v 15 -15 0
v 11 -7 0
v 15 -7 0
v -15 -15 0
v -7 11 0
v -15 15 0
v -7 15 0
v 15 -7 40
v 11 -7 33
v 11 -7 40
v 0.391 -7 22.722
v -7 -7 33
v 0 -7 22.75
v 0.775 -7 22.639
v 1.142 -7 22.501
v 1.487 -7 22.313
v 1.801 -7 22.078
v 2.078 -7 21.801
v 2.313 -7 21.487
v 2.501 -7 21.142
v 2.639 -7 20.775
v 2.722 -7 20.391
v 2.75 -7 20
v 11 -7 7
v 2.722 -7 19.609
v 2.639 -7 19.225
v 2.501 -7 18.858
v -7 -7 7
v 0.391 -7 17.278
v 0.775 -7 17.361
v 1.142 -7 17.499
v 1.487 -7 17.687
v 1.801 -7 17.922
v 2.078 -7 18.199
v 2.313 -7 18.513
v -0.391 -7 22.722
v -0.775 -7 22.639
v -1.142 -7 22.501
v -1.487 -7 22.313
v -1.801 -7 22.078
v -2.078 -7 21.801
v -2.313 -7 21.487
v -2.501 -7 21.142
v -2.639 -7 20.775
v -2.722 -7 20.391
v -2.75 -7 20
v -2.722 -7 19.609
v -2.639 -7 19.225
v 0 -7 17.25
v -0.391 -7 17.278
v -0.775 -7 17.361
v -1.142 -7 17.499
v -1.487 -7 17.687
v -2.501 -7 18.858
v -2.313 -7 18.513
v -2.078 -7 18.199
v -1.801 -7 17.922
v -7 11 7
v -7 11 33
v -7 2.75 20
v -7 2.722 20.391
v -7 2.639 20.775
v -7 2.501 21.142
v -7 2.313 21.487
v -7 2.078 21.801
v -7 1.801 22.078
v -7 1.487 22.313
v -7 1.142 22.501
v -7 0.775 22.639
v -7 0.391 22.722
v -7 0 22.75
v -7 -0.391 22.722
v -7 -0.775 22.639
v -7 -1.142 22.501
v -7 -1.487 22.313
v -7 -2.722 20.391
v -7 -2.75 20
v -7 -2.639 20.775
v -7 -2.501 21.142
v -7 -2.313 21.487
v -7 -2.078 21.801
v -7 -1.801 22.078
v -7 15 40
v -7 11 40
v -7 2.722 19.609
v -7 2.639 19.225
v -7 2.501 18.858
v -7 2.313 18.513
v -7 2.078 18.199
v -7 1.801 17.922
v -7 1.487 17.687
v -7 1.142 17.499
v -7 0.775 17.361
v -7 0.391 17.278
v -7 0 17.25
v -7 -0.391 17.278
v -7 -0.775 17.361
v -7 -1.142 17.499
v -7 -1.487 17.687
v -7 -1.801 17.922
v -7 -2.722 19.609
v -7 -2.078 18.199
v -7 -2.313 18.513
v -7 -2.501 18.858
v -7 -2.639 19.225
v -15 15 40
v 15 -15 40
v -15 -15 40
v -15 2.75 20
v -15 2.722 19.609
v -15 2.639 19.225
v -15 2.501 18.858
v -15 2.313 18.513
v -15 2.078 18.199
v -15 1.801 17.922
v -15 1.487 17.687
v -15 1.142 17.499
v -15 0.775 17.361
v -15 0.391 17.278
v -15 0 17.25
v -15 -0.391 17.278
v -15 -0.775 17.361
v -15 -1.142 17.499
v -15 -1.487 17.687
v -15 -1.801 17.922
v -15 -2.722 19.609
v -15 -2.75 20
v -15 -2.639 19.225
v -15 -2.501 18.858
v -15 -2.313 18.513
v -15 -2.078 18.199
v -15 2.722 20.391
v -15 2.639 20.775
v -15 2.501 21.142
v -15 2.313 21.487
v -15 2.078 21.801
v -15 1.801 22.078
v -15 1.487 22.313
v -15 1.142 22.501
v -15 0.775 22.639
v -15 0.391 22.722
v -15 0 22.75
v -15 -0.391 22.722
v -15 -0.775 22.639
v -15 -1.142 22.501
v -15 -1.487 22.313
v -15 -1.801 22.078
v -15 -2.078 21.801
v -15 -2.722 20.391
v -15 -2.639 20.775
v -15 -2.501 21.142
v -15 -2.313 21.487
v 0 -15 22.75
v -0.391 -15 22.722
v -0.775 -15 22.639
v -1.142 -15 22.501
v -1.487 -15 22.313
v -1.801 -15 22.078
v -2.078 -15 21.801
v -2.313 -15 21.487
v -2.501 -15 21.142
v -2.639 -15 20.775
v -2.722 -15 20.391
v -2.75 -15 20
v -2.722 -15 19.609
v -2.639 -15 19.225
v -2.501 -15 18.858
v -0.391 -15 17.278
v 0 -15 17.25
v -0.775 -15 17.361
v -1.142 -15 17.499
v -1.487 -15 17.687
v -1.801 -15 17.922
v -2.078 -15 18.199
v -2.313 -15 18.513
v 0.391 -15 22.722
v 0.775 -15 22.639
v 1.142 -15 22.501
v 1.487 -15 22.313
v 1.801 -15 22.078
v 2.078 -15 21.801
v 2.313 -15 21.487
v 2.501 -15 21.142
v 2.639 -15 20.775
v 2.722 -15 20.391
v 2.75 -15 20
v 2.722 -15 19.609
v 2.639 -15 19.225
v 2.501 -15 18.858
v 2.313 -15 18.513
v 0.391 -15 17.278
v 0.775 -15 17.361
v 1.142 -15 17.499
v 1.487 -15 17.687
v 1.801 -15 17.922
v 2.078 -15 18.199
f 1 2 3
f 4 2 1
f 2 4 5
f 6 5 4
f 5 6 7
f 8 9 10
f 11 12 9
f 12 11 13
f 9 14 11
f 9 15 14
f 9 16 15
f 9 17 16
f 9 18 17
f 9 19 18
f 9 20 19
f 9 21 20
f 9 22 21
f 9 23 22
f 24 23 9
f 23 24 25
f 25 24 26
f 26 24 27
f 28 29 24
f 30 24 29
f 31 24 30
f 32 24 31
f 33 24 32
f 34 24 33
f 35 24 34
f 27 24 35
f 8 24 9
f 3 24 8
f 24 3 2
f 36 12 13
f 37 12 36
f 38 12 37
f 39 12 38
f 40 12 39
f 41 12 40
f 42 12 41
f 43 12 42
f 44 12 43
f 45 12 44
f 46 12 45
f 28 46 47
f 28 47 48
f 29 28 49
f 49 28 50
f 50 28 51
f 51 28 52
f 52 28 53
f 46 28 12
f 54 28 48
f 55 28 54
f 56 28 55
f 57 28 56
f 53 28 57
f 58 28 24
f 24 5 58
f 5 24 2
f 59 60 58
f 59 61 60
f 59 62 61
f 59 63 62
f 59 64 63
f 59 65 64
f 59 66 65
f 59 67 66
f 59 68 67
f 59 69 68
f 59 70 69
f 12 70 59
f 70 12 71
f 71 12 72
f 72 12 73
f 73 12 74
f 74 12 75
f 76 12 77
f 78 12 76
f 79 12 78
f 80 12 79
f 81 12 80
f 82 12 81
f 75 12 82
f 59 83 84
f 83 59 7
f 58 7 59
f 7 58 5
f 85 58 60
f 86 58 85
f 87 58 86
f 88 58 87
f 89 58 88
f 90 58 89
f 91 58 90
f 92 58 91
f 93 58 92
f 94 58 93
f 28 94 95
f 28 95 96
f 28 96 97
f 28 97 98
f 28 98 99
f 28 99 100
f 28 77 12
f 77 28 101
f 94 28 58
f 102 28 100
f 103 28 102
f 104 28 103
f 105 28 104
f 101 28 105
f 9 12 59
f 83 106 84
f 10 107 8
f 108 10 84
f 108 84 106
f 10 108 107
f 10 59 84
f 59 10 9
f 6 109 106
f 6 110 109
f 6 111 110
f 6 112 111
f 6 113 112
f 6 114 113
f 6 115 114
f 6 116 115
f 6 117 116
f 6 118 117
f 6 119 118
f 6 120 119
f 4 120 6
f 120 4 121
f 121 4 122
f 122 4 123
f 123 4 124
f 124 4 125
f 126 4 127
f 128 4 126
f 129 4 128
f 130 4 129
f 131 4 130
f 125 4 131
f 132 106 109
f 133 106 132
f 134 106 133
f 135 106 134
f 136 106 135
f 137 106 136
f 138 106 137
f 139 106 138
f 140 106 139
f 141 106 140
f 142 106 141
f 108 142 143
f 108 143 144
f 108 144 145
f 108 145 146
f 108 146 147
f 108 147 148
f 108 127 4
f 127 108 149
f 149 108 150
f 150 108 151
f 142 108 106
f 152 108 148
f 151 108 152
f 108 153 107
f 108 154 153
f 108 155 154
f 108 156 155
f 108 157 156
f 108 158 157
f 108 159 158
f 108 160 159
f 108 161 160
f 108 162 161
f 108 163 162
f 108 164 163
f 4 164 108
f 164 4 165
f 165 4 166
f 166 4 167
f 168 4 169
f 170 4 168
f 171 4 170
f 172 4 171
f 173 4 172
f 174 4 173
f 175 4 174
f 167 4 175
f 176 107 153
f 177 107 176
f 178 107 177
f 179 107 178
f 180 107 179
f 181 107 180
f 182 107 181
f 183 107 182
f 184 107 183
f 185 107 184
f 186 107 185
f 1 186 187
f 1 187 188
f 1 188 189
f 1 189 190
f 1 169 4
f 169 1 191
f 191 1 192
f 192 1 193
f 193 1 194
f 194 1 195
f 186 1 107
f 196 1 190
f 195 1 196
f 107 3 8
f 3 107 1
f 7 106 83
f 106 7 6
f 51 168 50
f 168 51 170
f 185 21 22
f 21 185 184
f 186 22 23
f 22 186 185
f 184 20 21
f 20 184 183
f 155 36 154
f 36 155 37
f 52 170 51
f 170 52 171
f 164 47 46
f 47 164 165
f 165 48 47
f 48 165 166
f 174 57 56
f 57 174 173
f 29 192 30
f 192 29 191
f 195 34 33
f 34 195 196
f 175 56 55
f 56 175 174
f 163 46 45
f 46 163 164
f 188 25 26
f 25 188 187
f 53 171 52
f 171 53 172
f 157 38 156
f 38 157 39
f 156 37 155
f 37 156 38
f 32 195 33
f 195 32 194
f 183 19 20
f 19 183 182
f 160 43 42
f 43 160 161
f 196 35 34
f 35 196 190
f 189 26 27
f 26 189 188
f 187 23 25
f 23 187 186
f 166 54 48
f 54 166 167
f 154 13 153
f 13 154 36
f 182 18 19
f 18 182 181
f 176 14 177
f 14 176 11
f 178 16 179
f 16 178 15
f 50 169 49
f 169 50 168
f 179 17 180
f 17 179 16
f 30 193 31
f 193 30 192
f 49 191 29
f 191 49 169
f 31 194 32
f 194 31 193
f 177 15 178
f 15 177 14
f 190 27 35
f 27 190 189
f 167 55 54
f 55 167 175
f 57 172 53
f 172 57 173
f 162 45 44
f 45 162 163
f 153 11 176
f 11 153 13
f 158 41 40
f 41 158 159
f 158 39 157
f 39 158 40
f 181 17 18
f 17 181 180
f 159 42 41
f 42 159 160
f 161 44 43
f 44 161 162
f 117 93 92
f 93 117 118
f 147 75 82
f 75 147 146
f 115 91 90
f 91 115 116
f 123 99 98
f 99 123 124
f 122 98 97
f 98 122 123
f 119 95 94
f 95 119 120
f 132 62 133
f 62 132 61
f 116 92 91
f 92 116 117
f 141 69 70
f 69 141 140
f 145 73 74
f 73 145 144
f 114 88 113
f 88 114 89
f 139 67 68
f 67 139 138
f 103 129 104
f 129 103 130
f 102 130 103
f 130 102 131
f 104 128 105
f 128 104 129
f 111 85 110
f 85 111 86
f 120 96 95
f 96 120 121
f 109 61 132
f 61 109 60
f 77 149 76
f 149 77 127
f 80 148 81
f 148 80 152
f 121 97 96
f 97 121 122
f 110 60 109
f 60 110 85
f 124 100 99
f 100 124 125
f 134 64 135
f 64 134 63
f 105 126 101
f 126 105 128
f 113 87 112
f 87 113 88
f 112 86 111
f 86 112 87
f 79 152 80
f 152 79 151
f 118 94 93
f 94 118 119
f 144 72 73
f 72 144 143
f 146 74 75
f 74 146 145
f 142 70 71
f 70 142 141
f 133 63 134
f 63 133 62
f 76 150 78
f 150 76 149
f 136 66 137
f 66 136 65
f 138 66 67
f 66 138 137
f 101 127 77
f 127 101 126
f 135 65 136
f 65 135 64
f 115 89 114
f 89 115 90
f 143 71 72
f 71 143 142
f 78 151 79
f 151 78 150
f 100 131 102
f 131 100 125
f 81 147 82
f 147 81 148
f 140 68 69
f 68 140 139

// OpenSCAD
// ============================================================
// Heavy Duty Reinforcement Bracket
// 90-degree ABS-friendly bracket with centered mounting holes
// and outer-edge gussets that keep the center open.
//
// Coordinate system:
//   X = leg A length direction
//   Y = leg B length direction
//   Z = bracket face width
//
// The mounting faces lie on the XZ and YZ planes so the inside
// corner is easy to reason about and the hole positions stay
// centered as the parameters change.
//
// All units: millimeters.
// ============================================================

/* [Bracket Dimensions] */
leg_length              = 30;
face_width              = 40;
material_thickness      = 8;

/* [Mounting Holes] */
hole_diameter           = 5.5;   // M5 clearance default

/* [Bracing] */
gusset_band_width       = 7;
gusset_end_margin       = 4;

/* [View] */
export_mode             = "print"; // assembly, print

/* [Quality] */
$fa                     = 1;
$fs                     = 0.4;

// ============================================================
// DERIVED
// ============================================================

half_face_width         = face_width / 2;
gusset_band             = min(gusset_band_width, face_width / 2 - 0.2);
gusset_center_offset    = half_face_width - gusset_band / 2;
default_hole_center_from_corner = leg_length / 2;

// ============================================================
// HELPERS
// ============================================================

module flat_rect_2d(w, h) {
    square([w, h], center = true);
}

module horizontal_leg() {
    translate([leg_length / 2, material_thickness / 2, 0])
        rotate([90, 0, 0])
            linear_extrude(height = material_thickness, center = true)
                flat_rect_2d(leg_length, face_width);
}

module vertical_leg() {
    translate([material_thickness / 2, leg_length / 2, 0])
        rotate([0, 90, 0])
            linear_extrude(height = material_thickness, center = true)
                flat_rect_2d(face_width, leg_length);
}

module outer_gusset_profile() {
    polygon(points = [
        [material_thickness, material_thickness],
        [leg_length - gusset_end_margin, material_thickness],
        [material_thickness, leg_length - gusset_end_margin]
    ]);
}

module centered_holes(
    horizontal_hole_center_from_corner = default_hole_center_from_corner,
    vertical_hole_center_from_corner = default_hole_center_from_corner,
    horizontal_hole_diameter = hole_diameter,
    vertical_hole_diameter = hole_diameter
) {
    translate([horizontal_hole_center_from_corner, material_thickness / 2, 0])
        rotate([90, 0, 0])
            cylinder(h = material_thickness + 0.4, d = horizontal_hole_diameter, center = true);

    translate([material_thickness / 2, vertical_hole_center_from_corner, 0])
        rotate([0, 90, 0])
            cylinder(h = material_thickness + 0.4, d = vertical_hole_diameter, center = true);
}

// ============================================================
// GEOMETRY
// ============================================================

module side_gussets() {
    for (side = [-1, 1])
        translate([0, 0, side * gusset_center_offset])
            linear_extrude(height = gusset_band, center = true)
                outer_gusset_profile();
}

module reinforcement_bracket(
    horizontal_hole_center_from_corner = default_hole_center_from_corner,
    vertical_hole_center_from_corner = default_hole_center_from_corner,
    horizontal_hole_diameter = hole_diameter,
    vertical_hole_diameter = hole_diameter
) {
    difference() {
        union() {
            horizontal_leg();
            vertical_leg();
            side_gussets();
        }
        centered_holes(
            horizontal_hole_center_from_corner = horizontal_hole_center_from_corner,
            vertical_hole_center_from_corner = vertical_hole_center_from_corner,
            horizontal_hole_diameter = horizontal_hole_diameter,
            vertical_hole_diameter = vertical_hole_diameter
        );
    }
}

module print_preview() {
    translate([-leg_length / 2, -leg_length / 2, half_face_width])
        reinforcement_bracket();
}

// ============================================================
// EXPORT
// ============================================================

if (export_mode == "print") {
    print_preview();
} else {
    reinforcement_bracket();
}
